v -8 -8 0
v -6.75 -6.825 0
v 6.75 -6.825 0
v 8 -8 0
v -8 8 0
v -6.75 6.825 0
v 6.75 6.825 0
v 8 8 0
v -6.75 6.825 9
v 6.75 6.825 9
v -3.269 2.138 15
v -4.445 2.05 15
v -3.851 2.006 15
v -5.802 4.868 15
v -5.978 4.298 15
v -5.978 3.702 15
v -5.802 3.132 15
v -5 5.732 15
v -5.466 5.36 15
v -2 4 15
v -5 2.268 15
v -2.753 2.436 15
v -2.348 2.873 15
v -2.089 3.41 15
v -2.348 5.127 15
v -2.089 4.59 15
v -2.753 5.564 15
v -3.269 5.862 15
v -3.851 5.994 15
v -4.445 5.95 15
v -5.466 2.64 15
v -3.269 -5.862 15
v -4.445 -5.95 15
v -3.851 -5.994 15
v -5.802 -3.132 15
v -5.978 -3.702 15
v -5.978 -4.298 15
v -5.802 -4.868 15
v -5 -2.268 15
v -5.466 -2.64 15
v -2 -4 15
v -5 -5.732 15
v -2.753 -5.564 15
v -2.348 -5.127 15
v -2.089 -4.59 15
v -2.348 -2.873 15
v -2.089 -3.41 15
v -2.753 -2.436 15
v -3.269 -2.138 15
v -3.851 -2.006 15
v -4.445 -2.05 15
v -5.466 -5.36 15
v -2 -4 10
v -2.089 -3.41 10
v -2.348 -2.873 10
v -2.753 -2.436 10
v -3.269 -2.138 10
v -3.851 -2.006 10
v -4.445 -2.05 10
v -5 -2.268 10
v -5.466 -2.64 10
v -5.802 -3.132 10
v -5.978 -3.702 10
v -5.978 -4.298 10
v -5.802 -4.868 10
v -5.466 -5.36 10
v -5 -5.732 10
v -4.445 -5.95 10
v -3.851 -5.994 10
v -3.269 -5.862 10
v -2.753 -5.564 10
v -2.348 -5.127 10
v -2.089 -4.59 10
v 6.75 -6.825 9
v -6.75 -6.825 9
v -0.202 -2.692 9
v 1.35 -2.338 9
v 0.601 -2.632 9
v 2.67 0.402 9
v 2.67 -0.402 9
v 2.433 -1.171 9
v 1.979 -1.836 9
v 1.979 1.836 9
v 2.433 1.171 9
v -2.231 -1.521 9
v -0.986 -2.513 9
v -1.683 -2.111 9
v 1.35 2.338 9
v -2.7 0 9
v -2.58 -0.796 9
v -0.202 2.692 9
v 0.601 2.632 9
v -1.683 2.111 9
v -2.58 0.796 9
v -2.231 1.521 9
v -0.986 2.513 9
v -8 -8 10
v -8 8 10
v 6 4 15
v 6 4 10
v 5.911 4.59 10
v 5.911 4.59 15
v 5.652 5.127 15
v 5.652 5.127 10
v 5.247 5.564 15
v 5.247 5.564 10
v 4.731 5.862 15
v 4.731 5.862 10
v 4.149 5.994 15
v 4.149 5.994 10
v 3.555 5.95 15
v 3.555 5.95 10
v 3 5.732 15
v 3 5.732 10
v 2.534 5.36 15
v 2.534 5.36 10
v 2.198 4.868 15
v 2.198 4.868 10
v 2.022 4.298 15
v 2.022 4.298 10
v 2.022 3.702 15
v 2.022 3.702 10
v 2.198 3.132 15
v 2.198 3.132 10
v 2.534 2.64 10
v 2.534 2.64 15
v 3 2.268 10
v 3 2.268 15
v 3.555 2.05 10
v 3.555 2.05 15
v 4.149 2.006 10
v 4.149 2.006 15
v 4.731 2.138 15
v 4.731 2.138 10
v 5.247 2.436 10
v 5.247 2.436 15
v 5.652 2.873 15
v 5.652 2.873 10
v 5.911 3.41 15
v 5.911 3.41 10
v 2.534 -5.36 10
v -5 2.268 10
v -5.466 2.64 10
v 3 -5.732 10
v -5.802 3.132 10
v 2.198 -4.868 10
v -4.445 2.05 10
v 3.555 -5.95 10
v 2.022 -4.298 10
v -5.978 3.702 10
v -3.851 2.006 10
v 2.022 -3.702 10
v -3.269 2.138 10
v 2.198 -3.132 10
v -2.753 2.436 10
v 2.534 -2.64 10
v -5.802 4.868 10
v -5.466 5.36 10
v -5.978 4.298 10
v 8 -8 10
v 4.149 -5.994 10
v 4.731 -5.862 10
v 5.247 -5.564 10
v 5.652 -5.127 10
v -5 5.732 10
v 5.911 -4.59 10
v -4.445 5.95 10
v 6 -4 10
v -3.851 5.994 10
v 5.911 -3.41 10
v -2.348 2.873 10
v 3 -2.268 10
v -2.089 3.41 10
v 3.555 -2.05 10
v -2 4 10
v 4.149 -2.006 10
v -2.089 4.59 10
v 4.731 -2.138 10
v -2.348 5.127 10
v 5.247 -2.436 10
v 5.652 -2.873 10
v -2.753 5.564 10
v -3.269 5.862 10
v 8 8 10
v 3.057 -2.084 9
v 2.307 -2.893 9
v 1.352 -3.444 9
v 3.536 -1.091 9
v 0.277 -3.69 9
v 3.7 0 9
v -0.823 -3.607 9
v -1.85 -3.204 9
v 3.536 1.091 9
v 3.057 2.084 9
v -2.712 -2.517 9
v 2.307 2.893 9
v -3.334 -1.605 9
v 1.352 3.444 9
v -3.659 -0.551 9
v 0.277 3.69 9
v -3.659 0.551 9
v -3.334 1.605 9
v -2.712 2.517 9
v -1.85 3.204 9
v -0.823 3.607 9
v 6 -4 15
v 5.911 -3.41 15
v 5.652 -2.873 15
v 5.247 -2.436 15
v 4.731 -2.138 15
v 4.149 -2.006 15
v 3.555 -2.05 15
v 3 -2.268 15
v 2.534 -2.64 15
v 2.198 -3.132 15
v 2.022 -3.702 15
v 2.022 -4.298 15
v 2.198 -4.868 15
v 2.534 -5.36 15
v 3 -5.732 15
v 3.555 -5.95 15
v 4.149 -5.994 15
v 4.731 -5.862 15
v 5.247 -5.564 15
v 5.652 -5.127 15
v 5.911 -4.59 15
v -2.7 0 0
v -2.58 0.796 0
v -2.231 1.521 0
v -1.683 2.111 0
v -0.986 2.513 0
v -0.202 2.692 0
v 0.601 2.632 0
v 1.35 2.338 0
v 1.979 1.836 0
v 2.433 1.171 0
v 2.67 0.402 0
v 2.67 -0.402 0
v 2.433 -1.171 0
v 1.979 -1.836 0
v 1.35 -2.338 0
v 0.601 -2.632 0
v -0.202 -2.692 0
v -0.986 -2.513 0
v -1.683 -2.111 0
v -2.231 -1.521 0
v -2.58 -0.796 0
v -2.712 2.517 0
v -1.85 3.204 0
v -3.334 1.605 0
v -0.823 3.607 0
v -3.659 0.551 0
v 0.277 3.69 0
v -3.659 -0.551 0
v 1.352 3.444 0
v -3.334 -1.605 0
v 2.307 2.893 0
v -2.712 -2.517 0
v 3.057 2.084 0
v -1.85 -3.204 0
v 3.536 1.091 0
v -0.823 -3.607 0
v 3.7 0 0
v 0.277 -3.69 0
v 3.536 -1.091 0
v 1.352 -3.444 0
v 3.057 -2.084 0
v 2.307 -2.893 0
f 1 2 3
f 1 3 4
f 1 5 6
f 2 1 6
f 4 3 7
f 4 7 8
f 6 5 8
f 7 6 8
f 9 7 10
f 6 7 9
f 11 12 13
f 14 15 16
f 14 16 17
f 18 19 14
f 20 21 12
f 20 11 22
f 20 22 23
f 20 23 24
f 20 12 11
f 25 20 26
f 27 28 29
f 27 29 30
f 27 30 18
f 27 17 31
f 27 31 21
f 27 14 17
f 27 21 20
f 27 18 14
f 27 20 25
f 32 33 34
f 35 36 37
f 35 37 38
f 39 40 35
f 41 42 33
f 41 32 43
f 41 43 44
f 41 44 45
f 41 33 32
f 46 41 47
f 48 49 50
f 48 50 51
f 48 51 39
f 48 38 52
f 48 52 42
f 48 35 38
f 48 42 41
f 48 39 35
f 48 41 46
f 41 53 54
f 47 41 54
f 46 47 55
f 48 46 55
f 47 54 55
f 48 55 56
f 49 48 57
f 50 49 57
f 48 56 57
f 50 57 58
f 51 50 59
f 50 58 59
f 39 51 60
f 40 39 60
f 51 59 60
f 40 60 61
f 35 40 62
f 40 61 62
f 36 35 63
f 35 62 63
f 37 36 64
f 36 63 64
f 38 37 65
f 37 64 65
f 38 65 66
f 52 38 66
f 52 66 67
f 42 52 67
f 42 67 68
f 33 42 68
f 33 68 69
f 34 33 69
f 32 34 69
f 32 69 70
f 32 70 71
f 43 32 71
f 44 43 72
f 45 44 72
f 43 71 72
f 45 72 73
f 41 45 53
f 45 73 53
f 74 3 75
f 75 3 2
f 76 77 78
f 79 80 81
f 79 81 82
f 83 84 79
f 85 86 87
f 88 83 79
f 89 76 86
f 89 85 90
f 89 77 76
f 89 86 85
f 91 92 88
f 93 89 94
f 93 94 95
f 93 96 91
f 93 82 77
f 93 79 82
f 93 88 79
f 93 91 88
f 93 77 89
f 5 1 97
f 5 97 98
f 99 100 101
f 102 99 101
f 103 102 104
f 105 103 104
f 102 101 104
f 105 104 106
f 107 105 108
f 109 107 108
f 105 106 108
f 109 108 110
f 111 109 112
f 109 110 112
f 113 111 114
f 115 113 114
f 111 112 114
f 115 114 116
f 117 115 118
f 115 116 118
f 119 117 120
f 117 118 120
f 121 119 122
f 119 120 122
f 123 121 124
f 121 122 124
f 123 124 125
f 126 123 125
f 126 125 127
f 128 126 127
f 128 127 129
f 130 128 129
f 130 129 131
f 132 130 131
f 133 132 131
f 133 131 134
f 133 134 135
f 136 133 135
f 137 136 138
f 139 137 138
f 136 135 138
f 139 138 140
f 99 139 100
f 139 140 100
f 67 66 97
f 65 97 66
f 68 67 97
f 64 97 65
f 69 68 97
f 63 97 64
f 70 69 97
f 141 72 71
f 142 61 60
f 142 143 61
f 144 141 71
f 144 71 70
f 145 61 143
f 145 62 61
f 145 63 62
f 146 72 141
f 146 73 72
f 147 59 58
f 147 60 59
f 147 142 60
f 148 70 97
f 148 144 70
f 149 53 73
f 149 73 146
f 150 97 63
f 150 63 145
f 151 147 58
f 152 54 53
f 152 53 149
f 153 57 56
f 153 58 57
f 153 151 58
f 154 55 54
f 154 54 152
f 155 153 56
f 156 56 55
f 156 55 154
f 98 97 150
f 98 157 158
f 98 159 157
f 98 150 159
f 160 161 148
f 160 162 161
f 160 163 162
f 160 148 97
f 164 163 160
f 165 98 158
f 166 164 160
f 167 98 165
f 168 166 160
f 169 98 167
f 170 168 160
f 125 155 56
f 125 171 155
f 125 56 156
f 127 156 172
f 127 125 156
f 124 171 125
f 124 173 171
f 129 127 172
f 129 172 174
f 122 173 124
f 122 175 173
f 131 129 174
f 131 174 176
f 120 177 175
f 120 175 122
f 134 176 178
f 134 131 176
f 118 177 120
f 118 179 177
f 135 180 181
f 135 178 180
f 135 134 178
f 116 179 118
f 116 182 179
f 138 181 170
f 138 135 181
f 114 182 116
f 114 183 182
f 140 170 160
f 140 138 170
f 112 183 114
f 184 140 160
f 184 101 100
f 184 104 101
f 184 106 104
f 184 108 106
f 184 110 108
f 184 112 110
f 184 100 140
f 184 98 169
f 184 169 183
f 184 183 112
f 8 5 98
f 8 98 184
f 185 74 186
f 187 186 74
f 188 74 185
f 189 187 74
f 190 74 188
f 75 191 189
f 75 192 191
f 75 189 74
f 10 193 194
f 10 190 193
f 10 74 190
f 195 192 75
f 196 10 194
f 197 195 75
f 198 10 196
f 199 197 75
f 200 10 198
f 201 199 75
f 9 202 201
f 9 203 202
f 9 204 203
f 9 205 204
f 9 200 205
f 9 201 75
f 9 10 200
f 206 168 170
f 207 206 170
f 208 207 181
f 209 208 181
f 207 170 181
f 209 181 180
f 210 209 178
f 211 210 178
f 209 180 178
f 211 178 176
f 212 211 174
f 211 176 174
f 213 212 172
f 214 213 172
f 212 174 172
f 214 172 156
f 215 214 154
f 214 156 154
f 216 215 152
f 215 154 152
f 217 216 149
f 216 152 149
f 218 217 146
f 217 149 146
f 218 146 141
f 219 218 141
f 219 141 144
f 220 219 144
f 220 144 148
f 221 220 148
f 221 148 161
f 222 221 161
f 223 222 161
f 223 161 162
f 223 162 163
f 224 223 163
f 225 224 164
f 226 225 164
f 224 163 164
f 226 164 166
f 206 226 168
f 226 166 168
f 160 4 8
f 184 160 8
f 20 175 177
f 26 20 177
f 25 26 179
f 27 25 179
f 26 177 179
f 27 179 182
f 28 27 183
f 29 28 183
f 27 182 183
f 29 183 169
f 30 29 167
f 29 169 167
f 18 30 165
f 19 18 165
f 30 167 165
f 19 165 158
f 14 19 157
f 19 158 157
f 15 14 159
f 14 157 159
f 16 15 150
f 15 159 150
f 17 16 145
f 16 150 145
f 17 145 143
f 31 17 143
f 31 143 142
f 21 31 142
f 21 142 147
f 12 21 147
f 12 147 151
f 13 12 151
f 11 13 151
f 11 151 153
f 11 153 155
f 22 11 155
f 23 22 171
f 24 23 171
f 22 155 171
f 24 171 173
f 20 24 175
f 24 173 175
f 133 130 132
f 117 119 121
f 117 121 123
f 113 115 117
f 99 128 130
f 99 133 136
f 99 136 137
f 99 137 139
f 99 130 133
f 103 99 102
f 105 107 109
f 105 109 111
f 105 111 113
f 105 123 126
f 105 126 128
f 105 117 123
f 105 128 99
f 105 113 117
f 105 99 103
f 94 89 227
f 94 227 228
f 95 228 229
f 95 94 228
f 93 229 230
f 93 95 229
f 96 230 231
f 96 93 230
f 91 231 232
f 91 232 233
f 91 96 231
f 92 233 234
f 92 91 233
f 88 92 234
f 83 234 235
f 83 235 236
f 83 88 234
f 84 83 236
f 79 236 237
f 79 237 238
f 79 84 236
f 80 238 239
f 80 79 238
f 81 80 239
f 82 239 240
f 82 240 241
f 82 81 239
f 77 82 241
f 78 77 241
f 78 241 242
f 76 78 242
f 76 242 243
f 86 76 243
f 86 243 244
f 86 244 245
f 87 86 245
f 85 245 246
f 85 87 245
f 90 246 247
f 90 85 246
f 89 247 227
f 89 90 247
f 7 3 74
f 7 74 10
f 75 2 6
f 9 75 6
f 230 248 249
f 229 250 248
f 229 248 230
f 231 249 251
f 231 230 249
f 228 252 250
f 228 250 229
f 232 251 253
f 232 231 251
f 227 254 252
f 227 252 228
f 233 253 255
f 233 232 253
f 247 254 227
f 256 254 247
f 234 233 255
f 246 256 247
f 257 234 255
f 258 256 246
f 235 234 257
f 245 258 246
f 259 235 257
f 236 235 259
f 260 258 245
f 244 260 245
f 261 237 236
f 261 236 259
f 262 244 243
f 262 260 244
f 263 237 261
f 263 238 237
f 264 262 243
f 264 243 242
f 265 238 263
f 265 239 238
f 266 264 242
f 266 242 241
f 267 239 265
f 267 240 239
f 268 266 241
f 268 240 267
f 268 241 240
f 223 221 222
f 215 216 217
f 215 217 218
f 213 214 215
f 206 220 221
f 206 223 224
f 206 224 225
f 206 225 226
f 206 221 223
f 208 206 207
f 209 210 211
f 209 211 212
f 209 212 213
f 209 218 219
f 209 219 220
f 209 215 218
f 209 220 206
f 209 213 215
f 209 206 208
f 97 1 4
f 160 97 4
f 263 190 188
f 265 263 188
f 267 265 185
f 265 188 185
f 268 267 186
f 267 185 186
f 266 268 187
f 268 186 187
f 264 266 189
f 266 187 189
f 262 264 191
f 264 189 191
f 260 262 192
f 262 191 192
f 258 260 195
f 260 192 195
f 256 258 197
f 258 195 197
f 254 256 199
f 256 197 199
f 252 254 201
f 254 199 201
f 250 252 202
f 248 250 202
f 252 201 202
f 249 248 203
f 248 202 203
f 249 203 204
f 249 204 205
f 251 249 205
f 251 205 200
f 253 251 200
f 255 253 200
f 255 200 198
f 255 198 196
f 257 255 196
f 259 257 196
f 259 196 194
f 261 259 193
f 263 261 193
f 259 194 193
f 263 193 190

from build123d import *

# Parameters (mm, degrees)
SKETCH1_W           = 16
SKETCH1_H           = 16
BOSS_EXTRUDE1_DEPTH = 10
SKETCH2_R           = 2
BOSS_EXTRUDE3_DEPTH = 5
SKETCH3_W           = 13.5
SKETCH3_H           = 13.650151982
CUT_EXTRUDE1_DEPTH  = 9
SKETCH4_R           = 3.7
SKETCH4_R_2         = 2.7
BOSS_EXTRUDE4_DEPTH = 9


with BuildPart() as part:
    # Sketch1 → Boss-Extrude1 (new body)
    with BuildSketch(Plane.XY):
        Rectangle(SKETCH1_W, SKETCH1_H)
    extrude(amount=BOSS_EXTRUDE1_DEPTH)

    # Sketch2 → Boss-Extrude3 (add)
    with BuildSketch(Plane.XY.offset(10)):
        with Locations((-4, 4)):
            Circle(SKETCH2_R)
        with Locations((4, 4)):
            Circle(SKETCH2_R)
        with Locations((4, -4)):
            Circle(SKETCH2_R)
        with Locations((-4, -4)):
            Circle(SKETCH2_R)
    extrude(amount=BOSS_EXTRUDE3_DEPTH)

    # Sketch3 → Cut-Extrude1 (cut)
    with BuildSketch(Plane(origin=(0, 0, 0), x_dir=(-1, 0, 0), z_dir=(0, 0, -1))):
        Rectangle(SKETCH3_W, SKETCH3_H)
    extrude(amount=-CUT_EXTRUDE1_DEPTH, mode=Mode.SUBTRACT)

    # Sketch4 → Boss-Extrude4 (add)
    with BuildSketch(Plane(origin=(0, 0, 9), x_dir=(-1, 0, 0), z_dir=(0, 0, -1))):
        Circle(SKETCH4_R)
        Circle(SKETCH4_R_2, mode=Mode.SUBTRACT)
    extrude(amount=BOSS_EXTRUDE4_DEPTH)


solid = part.part
